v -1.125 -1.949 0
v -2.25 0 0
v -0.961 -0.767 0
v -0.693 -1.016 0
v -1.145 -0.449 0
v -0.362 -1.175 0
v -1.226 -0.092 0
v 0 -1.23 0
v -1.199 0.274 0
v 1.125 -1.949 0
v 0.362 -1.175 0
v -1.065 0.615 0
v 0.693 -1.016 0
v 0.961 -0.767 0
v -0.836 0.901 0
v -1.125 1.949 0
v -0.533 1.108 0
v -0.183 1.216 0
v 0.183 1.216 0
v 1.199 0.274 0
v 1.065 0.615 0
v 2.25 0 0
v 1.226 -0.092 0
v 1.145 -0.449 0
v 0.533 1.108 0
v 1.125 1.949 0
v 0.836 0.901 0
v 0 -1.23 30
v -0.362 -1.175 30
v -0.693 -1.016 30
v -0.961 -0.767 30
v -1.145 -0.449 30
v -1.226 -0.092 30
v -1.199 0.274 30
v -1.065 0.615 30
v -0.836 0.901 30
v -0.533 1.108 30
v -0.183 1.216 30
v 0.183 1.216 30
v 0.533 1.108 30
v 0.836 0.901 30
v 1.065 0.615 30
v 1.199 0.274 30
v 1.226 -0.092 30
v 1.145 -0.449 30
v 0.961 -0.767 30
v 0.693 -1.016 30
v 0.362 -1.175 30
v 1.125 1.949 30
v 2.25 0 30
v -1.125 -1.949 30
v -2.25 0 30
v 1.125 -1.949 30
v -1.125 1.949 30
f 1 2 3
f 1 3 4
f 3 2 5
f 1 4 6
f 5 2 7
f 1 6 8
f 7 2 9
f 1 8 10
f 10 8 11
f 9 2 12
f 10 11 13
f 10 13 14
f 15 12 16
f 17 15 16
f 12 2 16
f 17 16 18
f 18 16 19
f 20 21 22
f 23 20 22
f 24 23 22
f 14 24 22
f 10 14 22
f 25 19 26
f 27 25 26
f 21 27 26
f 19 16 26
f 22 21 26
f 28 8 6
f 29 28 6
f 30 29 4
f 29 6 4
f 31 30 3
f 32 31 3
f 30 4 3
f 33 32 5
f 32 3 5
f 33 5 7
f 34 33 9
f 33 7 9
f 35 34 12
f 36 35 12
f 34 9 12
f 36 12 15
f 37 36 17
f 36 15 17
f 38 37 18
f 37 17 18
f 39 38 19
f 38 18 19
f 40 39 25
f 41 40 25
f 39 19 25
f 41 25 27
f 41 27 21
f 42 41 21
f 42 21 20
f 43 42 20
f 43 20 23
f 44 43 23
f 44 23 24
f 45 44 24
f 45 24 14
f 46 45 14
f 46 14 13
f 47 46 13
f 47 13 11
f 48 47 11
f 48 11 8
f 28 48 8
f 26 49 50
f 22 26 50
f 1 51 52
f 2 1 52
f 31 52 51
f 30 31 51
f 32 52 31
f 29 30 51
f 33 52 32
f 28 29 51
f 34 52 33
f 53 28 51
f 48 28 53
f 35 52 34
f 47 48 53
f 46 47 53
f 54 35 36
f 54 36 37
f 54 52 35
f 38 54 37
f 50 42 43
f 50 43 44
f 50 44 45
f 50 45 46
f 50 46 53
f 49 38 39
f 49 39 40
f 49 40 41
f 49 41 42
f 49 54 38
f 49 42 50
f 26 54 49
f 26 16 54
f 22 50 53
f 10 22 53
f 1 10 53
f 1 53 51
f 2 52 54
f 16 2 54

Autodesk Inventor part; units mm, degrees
ref_plane "YZ Plane" through (0, 0, 0) normal (1, 0, 0) x (0, 1, 0)
ref_plane "XZ Plane" through (0, 0, 0) normal (0, 1, 0) x (-1, 0, 0)
ref_plane "XY Plane" through (0, 0, 0) normal (0, 0, 1) x (1, 0, 0)
sketch "Base" plane through (0, 0, 0) normal (0, 0, 1) x (1, 0, 0)
  circle A0 centre (0, 0) radius 1.5 construction
  circle A1 centre (0, 0) radius 2.25 construction
  line L0 (1.125, 1.9486) -> (2.25, 0)
  line L1 (2.25, 0) -> (1.125, -1.9486)
  line L2 (1.125, -1.9486) -> (-1.125, -1.9486)
  line L3 (-1.125, -1.9486) -> (-2.25, 0)
  line L4 (-2.25, 0) -> (-1.125, 1.9486)
  line L5 (-1.125, 1.9486) -> (1.125, 1.9486)
  line L6 (-3.15, 0) -> (3.15, 0) projected
  dimension "d1" = 4.5
  dimension "d0" = 3
extrude "BaseFeature" add sketch "Base" along normal blind 30
sketch "MountHole" plane through (0, 0, 30) normal (0, 0, 1) x (1, 0, 0)
  point P0 (0, 0)
hole "MountHoleFeature" at (0, 0, 30) direction (0, 0, -1) diameter 2.459 end through all thread size "M3x0.5" class "6H" standard "ISO Metric profile"
properties part number "M3-Standoff-30mm"
